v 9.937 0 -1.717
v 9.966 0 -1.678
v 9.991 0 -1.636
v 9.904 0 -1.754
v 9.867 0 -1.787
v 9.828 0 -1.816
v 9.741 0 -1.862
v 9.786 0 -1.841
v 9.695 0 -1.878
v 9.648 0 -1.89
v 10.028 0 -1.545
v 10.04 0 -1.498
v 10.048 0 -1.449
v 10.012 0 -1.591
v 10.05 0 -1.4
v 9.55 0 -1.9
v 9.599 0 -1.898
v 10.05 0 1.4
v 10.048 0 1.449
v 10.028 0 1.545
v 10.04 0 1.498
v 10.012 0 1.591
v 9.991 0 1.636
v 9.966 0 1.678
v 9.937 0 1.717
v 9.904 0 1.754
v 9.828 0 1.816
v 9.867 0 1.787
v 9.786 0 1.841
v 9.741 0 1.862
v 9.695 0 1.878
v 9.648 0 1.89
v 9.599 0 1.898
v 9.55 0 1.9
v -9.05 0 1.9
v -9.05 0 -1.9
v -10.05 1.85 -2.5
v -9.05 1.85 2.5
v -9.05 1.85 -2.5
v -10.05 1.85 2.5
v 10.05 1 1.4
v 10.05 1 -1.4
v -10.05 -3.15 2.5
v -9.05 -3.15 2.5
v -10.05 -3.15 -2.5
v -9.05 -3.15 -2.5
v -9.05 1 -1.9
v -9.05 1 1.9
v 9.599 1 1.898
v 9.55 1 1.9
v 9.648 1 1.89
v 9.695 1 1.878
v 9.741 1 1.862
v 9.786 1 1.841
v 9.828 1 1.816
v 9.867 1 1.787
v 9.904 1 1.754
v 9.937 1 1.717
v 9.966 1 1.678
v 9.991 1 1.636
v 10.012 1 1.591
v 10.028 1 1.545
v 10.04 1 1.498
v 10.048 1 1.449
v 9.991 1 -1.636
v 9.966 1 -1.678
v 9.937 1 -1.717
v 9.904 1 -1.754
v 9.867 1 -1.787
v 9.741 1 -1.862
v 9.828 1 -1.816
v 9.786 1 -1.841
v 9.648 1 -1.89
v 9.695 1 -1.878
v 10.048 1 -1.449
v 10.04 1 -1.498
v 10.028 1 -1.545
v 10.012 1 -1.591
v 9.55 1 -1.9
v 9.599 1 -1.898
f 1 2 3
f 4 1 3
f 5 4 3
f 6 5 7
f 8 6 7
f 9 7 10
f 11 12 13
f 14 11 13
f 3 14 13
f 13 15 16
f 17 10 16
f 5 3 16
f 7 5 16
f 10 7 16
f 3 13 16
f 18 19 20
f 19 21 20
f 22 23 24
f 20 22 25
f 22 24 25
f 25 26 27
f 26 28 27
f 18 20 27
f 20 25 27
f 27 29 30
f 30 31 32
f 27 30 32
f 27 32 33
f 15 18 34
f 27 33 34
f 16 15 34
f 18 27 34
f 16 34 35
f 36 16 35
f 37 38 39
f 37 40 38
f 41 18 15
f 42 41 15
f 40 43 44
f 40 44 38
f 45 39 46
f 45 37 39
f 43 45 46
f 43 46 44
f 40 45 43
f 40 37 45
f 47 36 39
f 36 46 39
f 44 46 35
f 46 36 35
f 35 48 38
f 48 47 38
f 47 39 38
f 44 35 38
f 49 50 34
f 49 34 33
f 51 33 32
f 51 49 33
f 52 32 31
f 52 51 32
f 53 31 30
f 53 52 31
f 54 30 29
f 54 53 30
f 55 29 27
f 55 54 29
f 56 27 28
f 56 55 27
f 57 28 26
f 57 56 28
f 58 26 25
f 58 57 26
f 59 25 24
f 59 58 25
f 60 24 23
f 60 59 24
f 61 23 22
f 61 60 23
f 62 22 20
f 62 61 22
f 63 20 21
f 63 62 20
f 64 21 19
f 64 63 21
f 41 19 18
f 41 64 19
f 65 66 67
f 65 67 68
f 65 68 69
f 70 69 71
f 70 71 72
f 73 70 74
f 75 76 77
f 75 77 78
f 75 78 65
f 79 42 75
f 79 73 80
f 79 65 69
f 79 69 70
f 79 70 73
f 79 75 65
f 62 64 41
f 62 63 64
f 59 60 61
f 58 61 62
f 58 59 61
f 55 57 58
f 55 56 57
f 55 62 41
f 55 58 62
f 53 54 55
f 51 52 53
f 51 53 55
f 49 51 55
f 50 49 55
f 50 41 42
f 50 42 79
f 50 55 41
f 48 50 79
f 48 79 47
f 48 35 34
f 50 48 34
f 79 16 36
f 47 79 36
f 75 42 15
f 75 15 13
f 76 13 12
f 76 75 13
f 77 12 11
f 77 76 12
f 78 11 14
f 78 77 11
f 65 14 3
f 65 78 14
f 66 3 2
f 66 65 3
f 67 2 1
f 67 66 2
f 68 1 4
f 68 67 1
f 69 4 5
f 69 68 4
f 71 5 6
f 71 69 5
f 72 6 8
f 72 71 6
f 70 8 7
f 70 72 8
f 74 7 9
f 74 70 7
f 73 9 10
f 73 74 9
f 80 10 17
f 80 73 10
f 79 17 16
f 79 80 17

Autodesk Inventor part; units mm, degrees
ref_plane "YZ Plane" through (0, 0, 0) normal (1, 0, 0) x (0, 1, 0)
ref_plane "XZ Plane" through (0, 0, 0) normal (0, 1, 0) x (-1, 0, 0)
ref_plane "XY Plane" through (0, 0, 0) normal (0, 0, 1) x (1, 0, 0)
sketch "Sketch1" plane through (0, 0, 0) normal (0, 1, 0) x (-1, 0, 0)
  line L0 (-10.05, -1.9) -> (10.05, -1.9)
  line L1 (10.05, -1.9) -> (10.05, 1.9)
  line L2 (10.05, 1.9) -> (-10.05, 1.9)
  line L3 (-10.05, 1.9) -> (-10.05, -1.9)
  line L4 (-10.05, -1.9) -> (10.05, 1.9) construction
  line L5 (10.05, -1.9) -> (-10.05, 1.9) construction
  point P0 (0, 0)
  dimension "d0" = 3.8
  dimension "d1" = 20.1
extrude "Extrusion1" add sketch "Sketch1" along normal blind 1
fillet "Fillet1" radius 0.5 2 edges at (10.05, 0.5, 1.9) (10.05, 0.5, -1.9)
sketch "Sketch2" plane through (-10.05, 0, -1.9) normal (-1, 0, 0) x (0, 0, 1)
  line L0 (0, 0) -> (3.8, 0) projected
  line L1 (3.8, 0) -> (3.8, 1) projected
  line L2 (0, 1) -> (3.8, 1) projected
  line L3 (0, 0) -> (0, 1) projected
  line L4 (-0.6, -3.15) -> (4.4, -3.15)
  line L5 (4.4, -3.15) -> (4.4, 1.85)
  line L6 (4.4, 1.85) -> (-0.6, 1.85)
  line L7 (-0.6, 1.85) -> (-0.6, -3.15)
  line L8 (-0.6, -3.15) -> (4.4, 1.85) construction
  line L9 (4.4, -3.15) -> (-0.6, 1.85) construction
  line L10 (-2.05, -4.6) -> (5.85, -4.6) construction
  line L11 (5.85, -4.6) -> (5.85, 3.3) construction
  line L12 (5.85, 3.3) -> (-2.05, 3.3) construction
  line L13 (-2.05, 3.3) -> (-2.05, -4.6) construction
  line L14 (-2.05, -4.6) -> (5.85, 3.3) construction
  line L15 (5.85, -4.6) -> (-2.05, 3.3) construction
  point P0 (1.9, 0)
  point P1 (1.9, -0.65)
  point P2 (1.9, -0.65)
  dimension "d5" = 5
  dimension "d6" = 5
  dimension "d7" = 7.9
  dimension "d8" = 7.9
  dimension "d9" = 3.3
  dimension "d10" = 2.5
extrude "Extrusion2" add sketch "Sketch2" against normal blind 1
properties part number "Powerpole45APCBStraight" material "Stainless Steel"
